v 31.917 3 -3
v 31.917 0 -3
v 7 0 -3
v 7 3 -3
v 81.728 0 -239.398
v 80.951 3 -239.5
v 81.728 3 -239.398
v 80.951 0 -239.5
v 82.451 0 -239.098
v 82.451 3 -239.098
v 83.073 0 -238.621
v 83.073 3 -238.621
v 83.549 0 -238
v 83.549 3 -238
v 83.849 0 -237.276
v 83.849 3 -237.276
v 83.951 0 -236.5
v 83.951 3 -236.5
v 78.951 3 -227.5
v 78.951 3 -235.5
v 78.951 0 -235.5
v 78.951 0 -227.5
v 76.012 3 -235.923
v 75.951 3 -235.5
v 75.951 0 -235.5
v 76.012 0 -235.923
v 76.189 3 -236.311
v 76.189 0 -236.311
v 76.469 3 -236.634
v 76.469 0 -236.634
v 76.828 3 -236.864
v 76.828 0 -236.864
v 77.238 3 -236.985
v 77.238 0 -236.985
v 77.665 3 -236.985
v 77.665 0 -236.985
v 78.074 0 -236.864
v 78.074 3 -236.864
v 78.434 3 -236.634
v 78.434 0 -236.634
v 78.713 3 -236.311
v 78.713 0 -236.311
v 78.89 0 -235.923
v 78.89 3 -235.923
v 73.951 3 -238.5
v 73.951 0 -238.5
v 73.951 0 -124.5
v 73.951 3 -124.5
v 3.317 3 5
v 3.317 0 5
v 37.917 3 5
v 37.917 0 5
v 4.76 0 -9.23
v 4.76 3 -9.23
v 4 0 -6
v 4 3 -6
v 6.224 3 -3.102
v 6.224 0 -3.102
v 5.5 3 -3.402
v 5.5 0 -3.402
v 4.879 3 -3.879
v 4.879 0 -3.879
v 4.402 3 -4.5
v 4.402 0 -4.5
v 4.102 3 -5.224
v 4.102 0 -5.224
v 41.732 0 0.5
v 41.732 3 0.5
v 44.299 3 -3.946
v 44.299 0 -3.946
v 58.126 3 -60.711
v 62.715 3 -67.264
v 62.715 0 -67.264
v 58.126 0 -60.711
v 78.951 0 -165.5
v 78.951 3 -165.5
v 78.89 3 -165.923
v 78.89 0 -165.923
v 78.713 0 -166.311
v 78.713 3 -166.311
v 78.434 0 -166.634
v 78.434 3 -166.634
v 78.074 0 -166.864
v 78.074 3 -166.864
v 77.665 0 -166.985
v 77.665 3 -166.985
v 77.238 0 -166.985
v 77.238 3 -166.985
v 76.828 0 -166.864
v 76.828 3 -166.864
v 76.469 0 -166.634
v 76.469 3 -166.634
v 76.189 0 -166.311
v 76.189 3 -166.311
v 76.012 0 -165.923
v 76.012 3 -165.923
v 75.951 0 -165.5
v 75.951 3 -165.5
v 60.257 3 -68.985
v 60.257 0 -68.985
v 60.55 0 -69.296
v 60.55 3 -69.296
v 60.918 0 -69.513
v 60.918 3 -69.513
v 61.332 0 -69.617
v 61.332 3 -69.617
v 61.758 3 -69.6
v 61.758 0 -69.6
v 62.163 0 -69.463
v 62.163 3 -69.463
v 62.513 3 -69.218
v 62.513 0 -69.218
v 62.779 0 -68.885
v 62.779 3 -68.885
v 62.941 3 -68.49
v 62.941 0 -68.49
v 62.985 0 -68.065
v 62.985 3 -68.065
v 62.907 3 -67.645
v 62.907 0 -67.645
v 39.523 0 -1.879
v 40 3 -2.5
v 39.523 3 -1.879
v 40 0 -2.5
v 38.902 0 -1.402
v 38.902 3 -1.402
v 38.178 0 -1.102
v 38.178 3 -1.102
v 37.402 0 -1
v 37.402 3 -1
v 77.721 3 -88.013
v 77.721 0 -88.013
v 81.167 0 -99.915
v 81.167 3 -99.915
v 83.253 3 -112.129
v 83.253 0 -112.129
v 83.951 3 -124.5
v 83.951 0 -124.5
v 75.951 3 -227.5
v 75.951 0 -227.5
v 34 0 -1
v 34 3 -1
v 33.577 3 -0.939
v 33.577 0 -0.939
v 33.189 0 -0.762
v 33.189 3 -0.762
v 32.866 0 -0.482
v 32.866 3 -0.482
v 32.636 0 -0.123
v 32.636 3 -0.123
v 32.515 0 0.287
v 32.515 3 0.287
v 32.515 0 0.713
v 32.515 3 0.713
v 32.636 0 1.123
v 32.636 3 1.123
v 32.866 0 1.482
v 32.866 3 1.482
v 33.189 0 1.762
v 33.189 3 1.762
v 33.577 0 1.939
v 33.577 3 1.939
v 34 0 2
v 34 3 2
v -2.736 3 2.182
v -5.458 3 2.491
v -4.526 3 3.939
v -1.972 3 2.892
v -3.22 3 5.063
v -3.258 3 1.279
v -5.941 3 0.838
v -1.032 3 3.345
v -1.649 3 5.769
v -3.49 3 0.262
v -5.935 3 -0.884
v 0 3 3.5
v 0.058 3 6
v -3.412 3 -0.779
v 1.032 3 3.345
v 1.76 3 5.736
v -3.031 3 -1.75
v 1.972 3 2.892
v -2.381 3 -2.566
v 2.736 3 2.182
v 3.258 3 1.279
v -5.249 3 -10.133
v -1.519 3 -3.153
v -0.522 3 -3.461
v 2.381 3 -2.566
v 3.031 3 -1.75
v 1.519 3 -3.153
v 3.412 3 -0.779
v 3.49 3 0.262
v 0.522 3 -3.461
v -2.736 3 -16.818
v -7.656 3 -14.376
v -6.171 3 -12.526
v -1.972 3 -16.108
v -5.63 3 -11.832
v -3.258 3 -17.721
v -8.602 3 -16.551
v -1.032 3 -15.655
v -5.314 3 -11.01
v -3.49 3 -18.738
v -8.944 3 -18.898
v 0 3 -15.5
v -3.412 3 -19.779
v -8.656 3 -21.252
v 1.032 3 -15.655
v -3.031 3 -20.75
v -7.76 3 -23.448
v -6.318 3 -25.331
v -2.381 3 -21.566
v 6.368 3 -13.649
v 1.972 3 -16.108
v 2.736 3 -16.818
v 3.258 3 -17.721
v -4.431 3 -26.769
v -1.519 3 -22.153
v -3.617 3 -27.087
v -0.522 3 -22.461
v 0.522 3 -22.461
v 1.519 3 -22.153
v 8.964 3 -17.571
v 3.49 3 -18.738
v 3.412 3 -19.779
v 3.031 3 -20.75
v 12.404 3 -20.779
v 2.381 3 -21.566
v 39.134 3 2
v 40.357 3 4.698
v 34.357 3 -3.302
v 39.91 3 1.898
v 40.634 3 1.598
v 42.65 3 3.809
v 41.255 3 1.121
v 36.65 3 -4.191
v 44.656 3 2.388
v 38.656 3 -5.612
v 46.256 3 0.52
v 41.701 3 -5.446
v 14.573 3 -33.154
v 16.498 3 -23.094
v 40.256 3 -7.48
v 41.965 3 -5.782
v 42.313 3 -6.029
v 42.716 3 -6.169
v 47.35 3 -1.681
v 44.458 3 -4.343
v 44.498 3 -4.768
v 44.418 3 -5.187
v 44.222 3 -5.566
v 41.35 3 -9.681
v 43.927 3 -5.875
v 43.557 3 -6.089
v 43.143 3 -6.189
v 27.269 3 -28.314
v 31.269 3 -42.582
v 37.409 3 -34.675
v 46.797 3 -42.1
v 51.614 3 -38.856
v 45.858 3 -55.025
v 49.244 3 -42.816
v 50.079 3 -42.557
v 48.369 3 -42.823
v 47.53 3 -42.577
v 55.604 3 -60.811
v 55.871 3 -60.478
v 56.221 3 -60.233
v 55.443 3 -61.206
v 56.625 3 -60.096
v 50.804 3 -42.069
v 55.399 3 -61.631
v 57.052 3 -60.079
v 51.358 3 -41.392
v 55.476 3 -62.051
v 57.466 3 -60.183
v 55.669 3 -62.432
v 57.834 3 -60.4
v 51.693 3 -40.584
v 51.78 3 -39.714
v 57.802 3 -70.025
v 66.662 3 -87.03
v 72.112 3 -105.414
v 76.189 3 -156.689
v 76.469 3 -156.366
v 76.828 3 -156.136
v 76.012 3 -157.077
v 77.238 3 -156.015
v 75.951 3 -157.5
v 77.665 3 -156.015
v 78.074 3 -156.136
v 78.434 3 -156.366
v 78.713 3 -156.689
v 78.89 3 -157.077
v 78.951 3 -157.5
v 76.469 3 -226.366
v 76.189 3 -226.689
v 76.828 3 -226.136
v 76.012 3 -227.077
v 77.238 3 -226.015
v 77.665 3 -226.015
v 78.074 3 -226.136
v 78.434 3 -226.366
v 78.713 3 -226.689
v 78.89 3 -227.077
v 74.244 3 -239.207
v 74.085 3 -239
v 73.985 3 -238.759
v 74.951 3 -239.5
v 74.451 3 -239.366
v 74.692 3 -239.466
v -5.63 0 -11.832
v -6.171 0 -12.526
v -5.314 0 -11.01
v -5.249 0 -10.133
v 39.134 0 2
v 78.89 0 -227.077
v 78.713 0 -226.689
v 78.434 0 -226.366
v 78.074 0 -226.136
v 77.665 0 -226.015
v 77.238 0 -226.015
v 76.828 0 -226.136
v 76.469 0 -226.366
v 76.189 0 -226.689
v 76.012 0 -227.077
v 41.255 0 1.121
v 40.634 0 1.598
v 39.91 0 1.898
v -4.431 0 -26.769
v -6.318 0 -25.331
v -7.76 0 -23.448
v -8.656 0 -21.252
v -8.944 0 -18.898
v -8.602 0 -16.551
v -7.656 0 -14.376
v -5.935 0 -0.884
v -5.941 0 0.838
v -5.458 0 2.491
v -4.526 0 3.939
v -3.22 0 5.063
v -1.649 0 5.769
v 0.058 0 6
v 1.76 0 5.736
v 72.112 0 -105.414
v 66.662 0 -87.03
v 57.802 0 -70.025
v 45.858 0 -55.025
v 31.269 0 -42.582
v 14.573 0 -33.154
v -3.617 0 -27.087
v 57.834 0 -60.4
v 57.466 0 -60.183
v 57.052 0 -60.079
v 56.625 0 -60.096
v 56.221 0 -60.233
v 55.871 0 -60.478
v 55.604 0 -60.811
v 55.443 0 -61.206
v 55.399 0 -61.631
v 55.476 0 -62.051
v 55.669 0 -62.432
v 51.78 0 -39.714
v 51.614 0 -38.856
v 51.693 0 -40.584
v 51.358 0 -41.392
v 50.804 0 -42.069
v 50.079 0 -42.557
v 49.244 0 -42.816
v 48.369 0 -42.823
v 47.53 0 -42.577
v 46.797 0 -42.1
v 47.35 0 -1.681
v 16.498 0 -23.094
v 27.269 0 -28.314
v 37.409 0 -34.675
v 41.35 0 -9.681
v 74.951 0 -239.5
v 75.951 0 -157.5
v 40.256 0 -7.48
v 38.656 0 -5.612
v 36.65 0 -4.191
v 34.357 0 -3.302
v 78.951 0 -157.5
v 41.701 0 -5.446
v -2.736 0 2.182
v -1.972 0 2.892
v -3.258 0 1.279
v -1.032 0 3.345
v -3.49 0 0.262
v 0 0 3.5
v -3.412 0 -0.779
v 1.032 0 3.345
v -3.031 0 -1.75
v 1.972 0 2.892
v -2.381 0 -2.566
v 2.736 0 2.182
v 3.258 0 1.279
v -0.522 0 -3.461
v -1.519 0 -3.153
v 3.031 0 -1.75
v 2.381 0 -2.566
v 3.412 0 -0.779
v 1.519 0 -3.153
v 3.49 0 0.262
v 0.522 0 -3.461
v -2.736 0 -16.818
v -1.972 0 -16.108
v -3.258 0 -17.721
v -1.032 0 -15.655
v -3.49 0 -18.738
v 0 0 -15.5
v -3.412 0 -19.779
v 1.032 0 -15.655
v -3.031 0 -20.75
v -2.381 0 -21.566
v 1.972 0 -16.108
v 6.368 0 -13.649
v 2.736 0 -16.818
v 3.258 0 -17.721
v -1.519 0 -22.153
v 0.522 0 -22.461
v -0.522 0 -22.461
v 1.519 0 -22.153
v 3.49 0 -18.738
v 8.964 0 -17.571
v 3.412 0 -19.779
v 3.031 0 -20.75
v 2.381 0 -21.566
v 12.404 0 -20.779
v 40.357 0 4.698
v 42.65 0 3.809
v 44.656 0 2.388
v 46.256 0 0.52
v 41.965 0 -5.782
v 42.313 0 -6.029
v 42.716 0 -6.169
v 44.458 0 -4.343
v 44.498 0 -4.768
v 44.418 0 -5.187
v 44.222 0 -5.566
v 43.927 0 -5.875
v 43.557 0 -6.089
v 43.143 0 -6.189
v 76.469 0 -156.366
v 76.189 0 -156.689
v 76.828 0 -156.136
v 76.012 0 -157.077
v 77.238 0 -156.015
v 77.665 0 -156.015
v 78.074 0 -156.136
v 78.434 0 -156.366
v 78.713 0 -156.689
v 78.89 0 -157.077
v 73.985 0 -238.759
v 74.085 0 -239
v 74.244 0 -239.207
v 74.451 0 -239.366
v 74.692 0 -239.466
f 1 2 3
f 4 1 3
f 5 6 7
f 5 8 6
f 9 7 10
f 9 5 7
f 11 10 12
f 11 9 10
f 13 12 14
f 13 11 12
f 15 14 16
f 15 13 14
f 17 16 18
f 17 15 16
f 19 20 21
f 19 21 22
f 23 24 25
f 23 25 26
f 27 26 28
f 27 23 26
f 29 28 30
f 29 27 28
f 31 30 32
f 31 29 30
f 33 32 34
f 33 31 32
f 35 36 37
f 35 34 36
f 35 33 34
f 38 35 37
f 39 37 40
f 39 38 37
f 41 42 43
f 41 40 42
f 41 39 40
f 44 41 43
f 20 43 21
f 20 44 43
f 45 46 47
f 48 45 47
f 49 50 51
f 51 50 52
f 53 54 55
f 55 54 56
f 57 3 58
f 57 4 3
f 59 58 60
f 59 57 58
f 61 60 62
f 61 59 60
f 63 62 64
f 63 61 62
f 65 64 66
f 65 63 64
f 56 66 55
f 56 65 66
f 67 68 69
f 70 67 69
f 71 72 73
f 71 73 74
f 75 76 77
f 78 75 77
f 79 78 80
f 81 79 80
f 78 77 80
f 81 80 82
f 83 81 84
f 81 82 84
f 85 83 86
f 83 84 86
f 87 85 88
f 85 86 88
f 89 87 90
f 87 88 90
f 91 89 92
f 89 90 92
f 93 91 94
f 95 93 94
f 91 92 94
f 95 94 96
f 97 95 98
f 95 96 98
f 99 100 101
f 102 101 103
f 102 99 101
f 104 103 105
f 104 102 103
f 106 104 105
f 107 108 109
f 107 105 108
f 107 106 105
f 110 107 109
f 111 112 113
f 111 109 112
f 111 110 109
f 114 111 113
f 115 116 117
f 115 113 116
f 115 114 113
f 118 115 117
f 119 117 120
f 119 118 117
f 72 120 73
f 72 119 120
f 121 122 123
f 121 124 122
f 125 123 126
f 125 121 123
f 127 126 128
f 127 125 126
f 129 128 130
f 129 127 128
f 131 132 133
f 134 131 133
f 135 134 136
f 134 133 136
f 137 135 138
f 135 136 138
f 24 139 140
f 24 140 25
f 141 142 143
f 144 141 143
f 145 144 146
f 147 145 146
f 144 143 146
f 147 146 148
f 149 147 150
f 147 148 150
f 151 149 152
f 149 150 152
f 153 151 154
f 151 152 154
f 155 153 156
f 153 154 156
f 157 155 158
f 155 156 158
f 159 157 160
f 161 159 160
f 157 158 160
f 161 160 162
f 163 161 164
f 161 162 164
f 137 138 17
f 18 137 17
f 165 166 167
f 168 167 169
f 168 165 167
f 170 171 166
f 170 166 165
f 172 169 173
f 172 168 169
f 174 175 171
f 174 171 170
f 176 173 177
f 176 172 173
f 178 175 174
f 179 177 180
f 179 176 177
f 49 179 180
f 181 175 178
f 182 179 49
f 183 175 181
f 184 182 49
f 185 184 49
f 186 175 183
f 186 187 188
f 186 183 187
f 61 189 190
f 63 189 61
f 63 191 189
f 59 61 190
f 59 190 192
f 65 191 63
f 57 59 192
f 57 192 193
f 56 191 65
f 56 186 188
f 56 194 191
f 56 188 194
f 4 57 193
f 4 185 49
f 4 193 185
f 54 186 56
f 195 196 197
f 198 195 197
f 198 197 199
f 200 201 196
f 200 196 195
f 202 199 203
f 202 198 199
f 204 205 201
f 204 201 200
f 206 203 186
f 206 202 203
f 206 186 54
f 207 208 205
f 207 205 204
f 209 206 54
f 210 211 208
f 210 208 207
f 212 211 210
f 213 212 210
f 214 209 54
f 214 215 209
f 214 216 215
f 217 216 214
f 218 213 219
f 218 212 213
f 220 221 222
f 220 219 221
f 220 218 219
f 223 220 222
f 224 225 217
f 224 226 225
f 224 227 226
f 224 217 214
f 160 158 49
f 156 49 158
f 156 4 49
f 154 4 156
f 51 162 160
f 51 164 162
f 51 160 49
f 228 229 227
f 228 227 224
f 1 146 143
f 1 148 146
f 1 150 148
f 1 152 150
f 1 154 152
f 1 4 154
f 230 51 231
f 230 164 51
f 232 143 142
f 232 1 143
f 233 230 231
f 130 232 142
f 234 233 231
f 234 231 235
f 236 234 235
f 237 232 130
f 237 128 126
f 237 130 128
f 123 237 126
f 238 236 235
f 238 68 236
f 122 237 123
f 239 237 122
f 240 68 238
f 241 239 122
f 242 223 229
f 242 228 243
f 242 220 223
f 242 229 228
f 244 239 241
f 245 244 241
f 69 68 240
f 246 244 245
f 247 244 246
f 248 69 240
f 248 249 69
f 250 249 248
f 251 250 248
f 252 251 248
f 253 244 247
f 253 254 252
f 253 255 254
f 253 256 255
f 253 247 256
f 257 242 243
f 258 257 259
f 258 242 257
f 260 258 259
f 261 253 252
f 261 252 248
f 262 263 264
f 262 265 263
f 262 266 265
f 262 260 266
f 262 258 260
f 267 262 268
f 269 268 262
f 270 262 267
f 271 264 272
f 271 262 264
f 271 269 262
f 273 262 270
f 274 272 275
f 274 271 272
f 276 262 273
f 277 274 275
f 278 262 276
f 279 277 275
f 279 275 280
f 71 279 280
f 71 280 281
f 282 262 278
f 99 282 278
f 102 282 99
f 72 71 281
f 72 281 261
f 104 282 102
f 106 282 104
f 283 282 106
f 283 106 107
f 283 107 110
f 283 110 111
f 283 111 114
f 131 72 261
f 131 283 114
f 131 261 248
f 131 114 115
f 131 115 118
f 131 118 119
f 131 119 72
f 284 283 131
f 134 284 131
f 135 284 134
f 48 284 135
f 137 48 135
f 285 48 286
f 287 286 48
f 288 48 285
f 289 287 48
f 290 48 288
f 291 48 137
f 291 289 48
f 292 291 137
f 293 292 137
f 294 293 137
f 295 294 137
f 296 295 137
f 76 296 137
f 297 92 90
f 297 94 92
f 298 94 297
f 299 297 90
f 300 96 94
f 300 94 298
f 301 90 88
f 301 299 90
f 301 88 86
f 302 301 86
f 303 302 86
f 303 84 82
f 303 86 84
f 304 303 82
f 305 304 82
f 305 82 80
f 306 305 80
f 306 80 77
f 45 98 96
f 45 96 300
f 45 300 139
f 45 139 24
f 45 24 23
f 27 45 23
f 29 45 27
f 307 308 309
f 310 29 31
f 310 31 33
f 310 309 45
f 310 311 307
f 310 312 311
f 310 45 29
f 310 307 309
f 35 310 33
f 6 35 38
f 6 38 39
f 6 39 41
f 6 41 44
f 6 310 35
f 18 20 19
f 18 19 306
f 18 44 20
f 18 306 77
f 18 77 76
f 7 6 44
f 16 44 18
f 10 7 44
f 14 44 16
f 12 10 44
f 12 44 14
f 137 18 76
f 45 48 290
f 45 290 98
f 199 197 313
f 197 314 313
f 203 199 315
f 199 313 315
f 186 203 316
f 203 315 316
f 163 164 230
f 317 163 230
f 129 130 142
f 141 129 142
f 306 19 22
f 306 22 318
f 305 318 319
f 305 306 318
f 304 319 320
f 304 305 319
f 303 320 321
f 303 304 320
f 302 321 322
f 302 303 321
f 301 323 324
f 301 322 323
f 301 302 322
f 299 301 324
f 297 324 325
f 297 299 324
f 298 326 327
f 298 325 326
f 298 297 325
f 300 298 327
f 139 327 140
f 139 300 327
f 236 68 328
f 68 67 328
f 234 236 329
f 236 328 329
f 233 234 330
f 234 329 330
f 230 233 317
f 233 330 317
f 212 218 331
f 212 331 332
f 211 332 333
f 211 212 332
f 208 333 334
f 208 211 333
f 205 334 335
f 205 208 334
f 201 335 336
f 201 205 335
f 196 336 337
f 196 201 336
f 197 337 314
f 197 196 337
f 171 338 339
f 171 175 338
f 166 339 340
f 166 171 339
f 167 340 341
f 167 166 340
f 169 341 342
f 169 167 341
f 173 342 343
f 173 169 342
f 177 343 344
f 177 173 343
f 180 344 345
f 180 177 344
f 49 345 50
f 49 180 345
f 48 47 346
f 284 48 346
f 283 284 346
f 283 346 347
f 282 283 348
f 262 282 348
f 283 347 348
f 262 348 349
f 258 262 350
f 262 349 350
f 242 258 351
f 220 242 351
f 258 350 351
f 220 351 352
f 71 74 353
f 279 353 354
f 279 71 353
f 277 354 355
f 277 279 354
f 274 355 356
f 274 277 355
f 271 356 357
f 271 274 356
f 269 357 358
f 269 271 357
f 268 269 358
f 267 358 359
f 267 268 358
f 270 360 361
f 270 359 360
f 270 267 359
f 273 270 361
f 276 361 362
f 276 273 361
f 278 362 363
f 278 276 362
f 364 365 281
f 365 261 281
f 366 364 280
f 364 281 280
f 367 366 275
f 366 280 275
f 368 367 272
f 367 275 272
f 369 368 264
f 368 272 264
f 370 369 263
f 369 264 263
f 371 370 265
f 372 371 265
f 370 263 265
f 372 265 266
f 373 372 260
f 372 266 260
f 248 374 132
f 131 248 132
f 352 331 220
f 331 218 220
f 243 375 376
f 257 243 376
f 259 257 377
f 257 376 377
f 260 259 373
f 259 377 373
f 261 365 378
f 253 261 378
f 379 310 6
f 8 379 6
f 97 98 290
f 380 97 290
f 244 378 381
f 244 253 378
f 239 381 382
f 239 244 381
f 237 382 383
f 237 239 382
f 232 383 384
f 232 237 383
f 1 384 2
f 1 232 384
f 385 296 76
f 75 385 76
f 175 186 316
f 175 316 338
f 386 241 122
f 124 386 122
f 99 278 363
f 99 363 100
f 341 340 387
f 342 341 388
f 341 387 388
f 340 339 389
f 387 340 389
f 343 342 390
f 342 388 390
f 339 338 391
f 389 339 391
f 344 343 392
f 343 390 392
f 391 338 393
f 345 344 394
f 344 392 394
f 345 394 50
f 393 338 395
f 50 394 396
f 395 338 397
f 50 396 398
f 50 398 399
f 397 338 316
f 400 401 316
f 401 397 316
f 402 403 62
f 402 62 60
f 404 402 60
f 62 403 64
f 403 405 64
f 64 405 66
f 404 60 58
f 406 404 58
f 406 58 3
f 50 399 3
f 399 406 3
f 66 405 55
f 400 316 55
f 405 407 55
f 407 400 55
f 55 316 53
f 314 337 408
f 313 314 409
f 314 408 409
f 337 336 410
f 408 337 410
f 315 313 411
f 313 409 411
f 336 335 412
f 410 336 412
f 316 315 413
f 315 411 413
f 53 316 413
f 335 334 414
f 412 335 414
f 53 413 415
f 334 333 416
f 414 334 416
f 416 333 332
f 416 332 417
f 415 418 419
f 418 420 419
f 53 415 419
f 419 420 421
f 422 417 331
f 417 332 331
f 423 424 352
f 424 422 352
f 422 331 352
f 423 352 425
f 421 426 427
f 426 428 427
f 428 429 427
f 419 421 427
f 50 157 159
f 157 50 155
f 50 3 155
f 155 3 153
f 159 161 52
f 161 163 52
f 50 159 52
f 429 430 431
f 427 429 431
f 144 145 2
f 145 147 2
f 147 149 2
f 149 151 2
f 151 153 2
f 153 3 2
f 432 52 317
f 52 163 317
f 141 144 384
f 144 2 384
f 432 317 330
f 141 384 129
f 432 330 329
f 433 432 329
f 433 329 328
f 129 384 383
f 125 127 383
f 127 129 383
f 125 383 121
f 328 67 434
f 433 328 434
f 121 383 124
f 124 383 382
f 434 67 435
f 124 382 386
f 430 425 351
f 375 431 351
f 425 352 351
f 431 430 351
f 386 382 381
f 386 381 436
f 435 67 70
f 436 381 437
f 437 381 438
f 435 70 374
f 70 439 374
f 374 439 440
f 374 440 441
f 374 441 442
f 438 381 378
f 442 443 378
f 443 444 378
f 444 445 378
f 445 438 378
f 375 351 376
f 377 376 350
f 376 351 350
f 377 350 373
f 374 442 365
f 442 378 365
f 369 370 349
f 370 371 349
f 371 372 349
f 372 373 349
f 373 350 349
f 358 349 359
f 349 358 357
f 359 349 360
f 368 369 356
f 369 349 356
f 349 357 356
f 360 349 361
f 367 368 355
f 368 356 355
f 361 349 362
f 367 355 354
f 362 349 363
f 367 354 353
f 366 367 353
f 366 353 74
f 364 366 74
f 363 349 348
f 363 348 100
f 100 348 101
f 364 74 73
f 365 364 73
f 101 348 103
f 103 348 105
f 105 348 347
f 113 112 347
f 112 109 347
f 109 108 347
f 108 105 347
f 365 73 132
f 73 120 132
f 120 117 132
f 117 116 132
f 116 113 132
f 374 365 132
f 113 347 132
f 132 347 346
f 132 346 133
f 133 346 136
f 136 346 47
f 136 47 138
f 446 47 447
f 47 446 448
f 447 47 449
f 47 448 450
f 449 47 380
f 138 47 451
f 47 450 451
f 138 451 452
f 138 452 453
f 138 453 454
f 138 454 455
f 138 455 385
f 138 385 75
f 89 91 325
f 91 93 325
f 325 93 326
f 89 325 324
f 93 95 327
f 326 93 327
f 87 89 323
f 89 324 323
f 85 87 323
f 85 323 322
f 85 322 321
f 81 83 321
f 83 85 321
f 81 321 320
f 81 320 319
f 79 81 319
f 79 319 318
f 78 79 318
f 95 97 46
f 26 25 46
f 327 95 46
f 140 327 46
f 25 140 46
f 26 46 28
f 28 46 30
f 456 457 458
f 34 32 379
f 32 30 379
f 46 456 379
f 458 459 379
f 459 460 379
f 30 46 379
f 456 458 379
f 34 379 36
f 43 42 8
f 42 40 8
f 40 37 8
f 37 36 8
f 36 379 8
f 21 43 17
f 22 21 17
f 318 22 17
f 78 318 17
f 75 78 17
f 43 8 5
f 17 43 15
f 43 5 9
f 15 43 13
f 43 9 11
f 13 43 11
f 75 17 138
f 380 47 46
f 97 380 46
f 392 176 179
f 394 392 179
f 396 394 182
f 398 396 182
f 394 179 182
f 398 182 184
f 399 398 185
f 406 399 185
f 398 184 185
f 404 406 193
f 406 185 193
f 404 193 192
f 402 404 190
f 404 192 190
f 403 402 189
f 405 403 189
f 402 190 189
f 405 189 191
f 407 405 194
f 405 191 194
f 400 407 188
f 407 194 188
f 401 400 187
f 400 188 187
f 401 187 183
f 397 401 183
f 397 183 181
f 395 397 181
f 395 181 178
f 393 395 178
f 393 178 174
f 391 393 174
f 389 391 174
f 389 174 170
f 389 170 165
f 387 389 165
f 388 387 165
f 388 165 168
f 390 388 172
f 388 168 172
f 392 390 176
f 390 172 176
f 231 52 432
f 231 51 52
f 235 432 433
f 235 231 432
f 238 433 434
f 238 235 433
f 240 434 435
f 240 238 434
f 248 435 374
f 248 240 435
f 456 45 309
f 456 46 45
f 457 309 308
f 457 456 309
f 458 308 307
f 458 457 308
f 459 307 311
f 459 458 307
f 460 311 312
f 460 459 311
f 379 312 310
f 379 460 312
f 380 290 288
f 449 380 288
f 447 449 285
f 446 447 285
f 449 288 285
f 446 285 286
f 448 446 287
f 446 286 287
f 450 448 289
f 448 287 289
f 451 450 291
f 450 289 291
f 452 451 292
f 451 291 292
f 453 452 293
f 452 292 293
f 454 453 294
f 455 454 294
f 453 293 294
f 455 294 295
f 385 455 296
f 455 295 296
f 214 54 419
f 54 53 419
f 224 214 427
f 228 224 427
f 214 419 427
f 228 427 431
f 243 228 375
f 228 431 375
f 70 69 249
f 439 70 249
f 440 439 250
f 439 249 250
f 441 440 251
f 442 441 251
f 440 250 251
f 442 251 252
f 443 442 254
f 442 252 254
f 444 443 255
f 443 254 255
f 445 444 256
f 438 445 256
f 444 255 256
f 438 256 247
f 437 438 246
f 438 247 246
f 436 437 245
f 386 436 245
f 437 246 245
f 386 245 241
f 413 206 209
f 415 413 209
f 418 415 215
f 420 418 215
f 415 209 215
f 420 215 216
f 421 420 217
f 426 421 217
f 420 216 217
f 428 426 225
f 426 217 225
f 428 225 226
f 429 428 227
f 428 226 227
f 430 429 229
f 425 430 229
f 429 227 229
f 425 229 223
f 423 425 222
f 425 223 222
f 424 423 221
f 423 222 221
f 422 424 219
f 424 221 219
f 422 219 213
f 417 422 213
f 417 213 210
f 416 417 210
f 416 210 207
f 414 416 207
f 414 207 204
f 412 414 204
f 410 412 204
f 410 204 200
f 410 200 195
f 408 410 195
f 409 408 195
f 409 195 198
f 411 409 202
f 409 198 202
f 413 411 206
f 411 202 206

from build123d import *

# Parameters (mm, degrees)
SKETCH_2_R          = 1.5
EXTRUDE_1_DEPTH     = 3
EXTRUDE_START       = -3
EXTRUDE_2_DEPTH     = 3
FILLET_3_R          = 3
FILLET_4_R          = 10
FILLET_5_R          = 3
CUT_EXTRUDE_1_DEPTH = 9.5
FILLET_6_R          = 3
CUT_EXTRUDE_2_DEPTH = 256.693293577
CUT_EXTRUDE_3_DEPTH = 256.693293577
SKETCH_7_W          = 10
SKETCH_7_H          = 2
CUT_EXTRUDE_4_DEPTH = 256.693293577
FILLET_9_R          = 1
FILLET_10_R         = 3
SKETCH_8_R          = 6
EXTRUDE_3_DEPTH     = 3
SKETCH_9_R          = 3.5
CUT_EXTRUDE_5_DEPTH = 3
SKETCH_10_R         = 3.5
CUT_EXTRUDE_6_DEPTH = 3
EXTRUDE_6_DEPTH     = 3
EXTRUDE_7_DEPTH     = 3
EXTRUDE_8_DEPTH     = 3
FILLET_12_R         = 3
FILLET_13_R         = 20


with BuildPart() as part:
    # 草图2 → 凸台-拉伸1 (new body)
    # profile 1 of 3: a face of its own
    with BuildSketch(Plane(origin=(0, 0, 0), x_dir=(1, 0, 0), z_dir=(0, 1, 0))):
        with BuildLine():
            Line((-4, 27), (-4, 23))
            Line((-4, 23), (-4, 3))
            ThreePointArc((-4, 3), (0, 5), (4, 3))
            Line((4, 3), (4, 18.72063168))
            ThreePointArc((4, 18.72063168), (61.714912944, 58.202422296), (83.951238111, 124.5))
            Line((83.951238111, 124.5), (83.951238111, 241.5))
            Line((83.951238111, 241.5), (73.951238111, 241.5))
            Line((73.951238111, 241.5), (73.951238111, 124.5))
            ThreePointArc((73.951238111, 124.5), (52.067846257, 62.084766437), (-4, 27))
        make_face()
        with Locations(Location((0, 19, 0), (0, 0, 270))):
            Circle(SKETCH_2_R, mode=Mode.SUBTRACT)
    # profile 2 of 3: a face of its own
    with BuildSketch(Plane(origin=(0, 0, 0), x_dir=(1, 0, 0), z_dir=(0, 1, 0))):
        with BuildLine():
            ThreePointArc((4, 3), (0, 5), (-4, 3))
            Line((-4, 3), (-4, 0))
            Line((-4, 0), (-1.5, 0))
            ThreePointArc((-1.5, 0), (0, 1.5), (1.5, 0))
            Line((1.5, 0), (4, 0))
            Line((4, 0), (4, 3))
        make_face()
    # profile 3 of 3: a face of its own
    with BuildSketch(Plane(origin=(0, 0, 0), x_dir=(1, 0, 0), z_dir=(0, 1, 0))):
        with BuildLine():
            Line((-4, 0), (-4, 3))
            ThreePointArc((-4, 3), (-1.58113883, -4.74341649), (5, 0))
            ThreePointArc((5, 0), (4.74341649, 1.58113883), (4, 3))
            Line((4, 3), (4, 0))
            Line((4, 0), (1.5, 0))
            ThreePointArc((1.5, 0), (0, -1.5), (-1.5, 0))
            Line((-1.5, 0), (-4, 0))
        make_face()
    extrude(amount=EXTRUDE_1_DEPTH)

    # 草图3 → 凸台-拉伸2 (add)
    with BuildSketch(Plane(origin=(0, 3, 0), x_dir=(1, 0, 0), z_dir=(0, 1, 0)).offset(EXTRUDE_START)):
        with BuildLine():
            ThreePointArc((4, 3), (4.472135955, -2.236067977), (0, -5))
            Line((0, -5), (45, -5))
            Line((45, -5), (77.720510398, 88.012598271))
            ThreePointArc((77.720510398, 88.012598271), (68.645690453, 68.540478551), (55.957710685, 51.204649386))
            Line((55.957710685, 51.204649386), (39, 3))
            Line((39, 3), (4, 3))
        make_face()
    extrude(amount=EXTRUDE_2_DEPTH)

    # 圆角3
    fillet_3_edges = [part.edges().sort_by_distance(p)[0] for p in [
        (55.957710685, 1.5, -51.204649386),
    ]]
    fillet(fillet_3_edges, radius=FILLET_3_R)

    # 圆角4
    fillet_4_edges = [part.edges().sort_by_distance(p)[0] for p in [
        (39, 1.5, -3),
        (45, 1.5, 5),
    ]]
    fillet(fillet_4_edges, radius=FILLET_4_R)

    # 圆角5
    fillet_5_edges = [part.edges().sort_by_distance(p)[0] for p in [
        (4, 1.5, -3),
        (-4, 1.5, -3),
    ]]
    fillet(fillet_5_edges, radius=FILLET_5_R)

    # 草图4 → 切除-拉伸1 (cut)
    with BuildSketch(Plane(origin=(0, 3, 0), x_dir=(1, 0, 0), z_dir=(0, 1, 0))):
        with BuildLine():
            Line((40.866025404, -2), (44.299038106, 3.946152423))
            ThreePointArc((44.299038106, 3.946152423), (43.75, 5.995190528), (41.700961894, 5.446152423))
            Line((41.700961894, 5.446152423), (39.133974596, 1))
            Line((39.133974596, 1), (34, 1))
            ThreePointArc((34, 1), (32.5, -0.5), (34, -2))
            Line((34, -2), (40.866025404, -2))
        make_face()
    extrude(amount=-CUT_EXTRUDE_1_DEPTH, mode=Mode.SUBTRACT)

    # 圆角6
    fillet_6_edges = [part.edges().sort_by_distance(p)[0] for p in [
        (40.866025404, 1.5, 2),
        (39.133974596, 1.5, -1),
    ]]
    fillet(fillet_6_edges, radius=FILLET_6_R)

    # 草图5 → 切除-拉伸2 (cut, through all)
    with BuildSketch(Plane(origin=(0, 3, 0), x_dir=(1, 0, 0), z_dir=(0, 1, 0))):
        with BuildLine():
            Line((62.714846418, 67.264294142), (58.126234927, 60.711077788))
            ThreePointArc((58.126234927, 60.711077788), (56.037142206, 60.342714376), (55.668778794, 62.431807097))
            Line((55.668778794, 62.431807097), (60.257390285, 68.985023451))
            ThreePointArc((60.257390285, 68.985023451), (62.346483006, 69.353386863), (62.714846418, 67.264294142))
        make_face()
    extrude(amount=-CUT_EXTRUDE_2_DEPTH, mode=Mode.SUBTRACT)

    # 草图6 → 切除-拉伸3 (cut, through all)
    with BuildSketch(Plane(origin=(0, 3, 0), x_dir=(1, 0, 0), z_dir=(0, 1, 0))):
        with BuildLine():
            Line((78.951238111, 235.5), (78.951238111, 227.5))
            ThreePointArc((78.951238111, 227.5), (77.451238111, 226), (75.951238111, 227.5))
            Line((75.951238111, 227.5), (75.951238111, 235.5))
            ThreePointArc((75.951238111, 235.5), (77.451238111, 237), (78.951238111, 235.5))
        make_face()
        with BuildLine():
            Line((75.951238111, 165.5), (75.951238111, 157.5))
            ThreePointArc((75.951238111, 157.5), (77.451238111, 156), (78.951238111, 157.5))
            Line((78.951238111, 157.5), (78.951238111, 165.5))
            ThreePointArc((78.951238111, 165.5), (77.451238111, 167), (75.951238111, 165.5))
        make_face()
    extrude(amount=-CUT_EXTRUDE_3_DEPTH, mode=Mode.SUBTRACT)

    # 草图7 → 切除-拉伸4 (cut, through all)
    with BuildSketch(Plane(origin=(0, 3, 0), x_dir=(1, 0, 0), z_dir=(0, 1, 0))):
        with Locations((78.951238111, 240.5)):
            Rectangle(SKETCH_7_W, SKETCH_7_H)
    extrude(amount=-CUT_EXTRUDE_4_DEPTH, mode=Mode.SUBTRACT)

    # 圆角9
    fillet_9_edges = [part.edges().sort_by_distance(p)[0] for p in [
        (73.951238111, 1.5, -239.5),
    ]]
    fillet(fillet_9_edges, radius=FILLET_9_R)

    # 圆角10
    fillet_10_edges = [part.edges().sort_by_distance(p)[0] for p in [
        (83.951238111, 1.5, -239.5),
    ]]
    fillet(fillet_10_edges, radius=FILLET_10_R)

    # 草图8 → 凸台-拉伸3 (add)
    with BuildSketch(Plane(origin=(0, 3, 0), x_dir=(1, 0, 0), z_dir=(0, 1, 0))):
        Circle(SKETCH_8_R)
    extrude(amount=-EXTRUDE_3_DEPTH)

    # 草图9 → 切除-拉伸5 (cut)
    with BuildSketch(Plane(origin=(0, 3, 0), x_dir=(1, 0, 0), z_dir=(0, 1, 0))):
        with Locations(Location((0, 0, 0), (0, 0, 270))):
            Circle(SKETCH_9_R)
    extrude(amount=-CUT_EXTRUDE_5_DEPTH, mode=Mode.SUBTRACT)

    # 草图10 → 切除-拉伸6 (cut)
    with BuildSketch(Plane(origin=(0, 3, 0), x_dir=(1, 0, 0), z_dir=(0, 1, 0))):
        with Locations(Location((0, 19, 0), (0, 0, 270))):
            Circle(SKETCH_10_R)
    extrude(amount=-CUT_EXTRUDE_6_DEPTH, mode=Mode.SUBTRACT)

    # 草图12 → 凸台-拉伸6 (add)
    with BuildSketch(Plane(origin=(0, 3, 0), x_dir=(1, 0, 0), z_dir=(0, 1, 0))):
        Polygon((4, 6), (4, 18.72063168), (7.464101615, 20.72063168), align=None)
    extrude(amount=-EXTRUDE_6_DEPTH)

    # 草图14 → 凸台-拉伸7 (add)
    with BuildSketch(Plane(origin=(0, 3, 0), x_dir=(1, 0, 0), z_dir=(0, 1, 0))):
        Polygon((-4, 27), (-6, 0), (-4, 4.472135955), align=None)
    extrude(amount=-EXTRUDE_7_DEPTH)

    # 草图15 → 凸台-拉伸8 (add)
    with BuildSketch(Plane(origin=(0, 3, 0), x_dir=(1, 0, 0), z_dir=(0, 1, 0))):
        with BuildLine():
            Line((-5.135061392, 11.676671214), (-4, 27))
            ThreePointArc((-4, 27), (-8.919833963, 19.660728442), (-5.135061392, 11.676671214))
        make_face()
    extrude(amount=-EXTRUDE_8_DEPTH)

    # 圆角12
    fillet_12_edges = [part.edges().sort_by_distance(p)[0] for p in [
        (-4, 1.5, -27),
        (-5.135061392, 1.5, -11.676671214),
    ]]
    fillet(fillet_12_edges, radius=FILLET_12_R)

    # 圆角13
    fillet_13_edges = [part.edges().sort_by_distance(p)[0] for p in [
        (7.221005183, 1.5, -19.687598172),
    ]]
    fillet(fillet_13_edges, radius=FILLET_13_R)


solid = part.part
